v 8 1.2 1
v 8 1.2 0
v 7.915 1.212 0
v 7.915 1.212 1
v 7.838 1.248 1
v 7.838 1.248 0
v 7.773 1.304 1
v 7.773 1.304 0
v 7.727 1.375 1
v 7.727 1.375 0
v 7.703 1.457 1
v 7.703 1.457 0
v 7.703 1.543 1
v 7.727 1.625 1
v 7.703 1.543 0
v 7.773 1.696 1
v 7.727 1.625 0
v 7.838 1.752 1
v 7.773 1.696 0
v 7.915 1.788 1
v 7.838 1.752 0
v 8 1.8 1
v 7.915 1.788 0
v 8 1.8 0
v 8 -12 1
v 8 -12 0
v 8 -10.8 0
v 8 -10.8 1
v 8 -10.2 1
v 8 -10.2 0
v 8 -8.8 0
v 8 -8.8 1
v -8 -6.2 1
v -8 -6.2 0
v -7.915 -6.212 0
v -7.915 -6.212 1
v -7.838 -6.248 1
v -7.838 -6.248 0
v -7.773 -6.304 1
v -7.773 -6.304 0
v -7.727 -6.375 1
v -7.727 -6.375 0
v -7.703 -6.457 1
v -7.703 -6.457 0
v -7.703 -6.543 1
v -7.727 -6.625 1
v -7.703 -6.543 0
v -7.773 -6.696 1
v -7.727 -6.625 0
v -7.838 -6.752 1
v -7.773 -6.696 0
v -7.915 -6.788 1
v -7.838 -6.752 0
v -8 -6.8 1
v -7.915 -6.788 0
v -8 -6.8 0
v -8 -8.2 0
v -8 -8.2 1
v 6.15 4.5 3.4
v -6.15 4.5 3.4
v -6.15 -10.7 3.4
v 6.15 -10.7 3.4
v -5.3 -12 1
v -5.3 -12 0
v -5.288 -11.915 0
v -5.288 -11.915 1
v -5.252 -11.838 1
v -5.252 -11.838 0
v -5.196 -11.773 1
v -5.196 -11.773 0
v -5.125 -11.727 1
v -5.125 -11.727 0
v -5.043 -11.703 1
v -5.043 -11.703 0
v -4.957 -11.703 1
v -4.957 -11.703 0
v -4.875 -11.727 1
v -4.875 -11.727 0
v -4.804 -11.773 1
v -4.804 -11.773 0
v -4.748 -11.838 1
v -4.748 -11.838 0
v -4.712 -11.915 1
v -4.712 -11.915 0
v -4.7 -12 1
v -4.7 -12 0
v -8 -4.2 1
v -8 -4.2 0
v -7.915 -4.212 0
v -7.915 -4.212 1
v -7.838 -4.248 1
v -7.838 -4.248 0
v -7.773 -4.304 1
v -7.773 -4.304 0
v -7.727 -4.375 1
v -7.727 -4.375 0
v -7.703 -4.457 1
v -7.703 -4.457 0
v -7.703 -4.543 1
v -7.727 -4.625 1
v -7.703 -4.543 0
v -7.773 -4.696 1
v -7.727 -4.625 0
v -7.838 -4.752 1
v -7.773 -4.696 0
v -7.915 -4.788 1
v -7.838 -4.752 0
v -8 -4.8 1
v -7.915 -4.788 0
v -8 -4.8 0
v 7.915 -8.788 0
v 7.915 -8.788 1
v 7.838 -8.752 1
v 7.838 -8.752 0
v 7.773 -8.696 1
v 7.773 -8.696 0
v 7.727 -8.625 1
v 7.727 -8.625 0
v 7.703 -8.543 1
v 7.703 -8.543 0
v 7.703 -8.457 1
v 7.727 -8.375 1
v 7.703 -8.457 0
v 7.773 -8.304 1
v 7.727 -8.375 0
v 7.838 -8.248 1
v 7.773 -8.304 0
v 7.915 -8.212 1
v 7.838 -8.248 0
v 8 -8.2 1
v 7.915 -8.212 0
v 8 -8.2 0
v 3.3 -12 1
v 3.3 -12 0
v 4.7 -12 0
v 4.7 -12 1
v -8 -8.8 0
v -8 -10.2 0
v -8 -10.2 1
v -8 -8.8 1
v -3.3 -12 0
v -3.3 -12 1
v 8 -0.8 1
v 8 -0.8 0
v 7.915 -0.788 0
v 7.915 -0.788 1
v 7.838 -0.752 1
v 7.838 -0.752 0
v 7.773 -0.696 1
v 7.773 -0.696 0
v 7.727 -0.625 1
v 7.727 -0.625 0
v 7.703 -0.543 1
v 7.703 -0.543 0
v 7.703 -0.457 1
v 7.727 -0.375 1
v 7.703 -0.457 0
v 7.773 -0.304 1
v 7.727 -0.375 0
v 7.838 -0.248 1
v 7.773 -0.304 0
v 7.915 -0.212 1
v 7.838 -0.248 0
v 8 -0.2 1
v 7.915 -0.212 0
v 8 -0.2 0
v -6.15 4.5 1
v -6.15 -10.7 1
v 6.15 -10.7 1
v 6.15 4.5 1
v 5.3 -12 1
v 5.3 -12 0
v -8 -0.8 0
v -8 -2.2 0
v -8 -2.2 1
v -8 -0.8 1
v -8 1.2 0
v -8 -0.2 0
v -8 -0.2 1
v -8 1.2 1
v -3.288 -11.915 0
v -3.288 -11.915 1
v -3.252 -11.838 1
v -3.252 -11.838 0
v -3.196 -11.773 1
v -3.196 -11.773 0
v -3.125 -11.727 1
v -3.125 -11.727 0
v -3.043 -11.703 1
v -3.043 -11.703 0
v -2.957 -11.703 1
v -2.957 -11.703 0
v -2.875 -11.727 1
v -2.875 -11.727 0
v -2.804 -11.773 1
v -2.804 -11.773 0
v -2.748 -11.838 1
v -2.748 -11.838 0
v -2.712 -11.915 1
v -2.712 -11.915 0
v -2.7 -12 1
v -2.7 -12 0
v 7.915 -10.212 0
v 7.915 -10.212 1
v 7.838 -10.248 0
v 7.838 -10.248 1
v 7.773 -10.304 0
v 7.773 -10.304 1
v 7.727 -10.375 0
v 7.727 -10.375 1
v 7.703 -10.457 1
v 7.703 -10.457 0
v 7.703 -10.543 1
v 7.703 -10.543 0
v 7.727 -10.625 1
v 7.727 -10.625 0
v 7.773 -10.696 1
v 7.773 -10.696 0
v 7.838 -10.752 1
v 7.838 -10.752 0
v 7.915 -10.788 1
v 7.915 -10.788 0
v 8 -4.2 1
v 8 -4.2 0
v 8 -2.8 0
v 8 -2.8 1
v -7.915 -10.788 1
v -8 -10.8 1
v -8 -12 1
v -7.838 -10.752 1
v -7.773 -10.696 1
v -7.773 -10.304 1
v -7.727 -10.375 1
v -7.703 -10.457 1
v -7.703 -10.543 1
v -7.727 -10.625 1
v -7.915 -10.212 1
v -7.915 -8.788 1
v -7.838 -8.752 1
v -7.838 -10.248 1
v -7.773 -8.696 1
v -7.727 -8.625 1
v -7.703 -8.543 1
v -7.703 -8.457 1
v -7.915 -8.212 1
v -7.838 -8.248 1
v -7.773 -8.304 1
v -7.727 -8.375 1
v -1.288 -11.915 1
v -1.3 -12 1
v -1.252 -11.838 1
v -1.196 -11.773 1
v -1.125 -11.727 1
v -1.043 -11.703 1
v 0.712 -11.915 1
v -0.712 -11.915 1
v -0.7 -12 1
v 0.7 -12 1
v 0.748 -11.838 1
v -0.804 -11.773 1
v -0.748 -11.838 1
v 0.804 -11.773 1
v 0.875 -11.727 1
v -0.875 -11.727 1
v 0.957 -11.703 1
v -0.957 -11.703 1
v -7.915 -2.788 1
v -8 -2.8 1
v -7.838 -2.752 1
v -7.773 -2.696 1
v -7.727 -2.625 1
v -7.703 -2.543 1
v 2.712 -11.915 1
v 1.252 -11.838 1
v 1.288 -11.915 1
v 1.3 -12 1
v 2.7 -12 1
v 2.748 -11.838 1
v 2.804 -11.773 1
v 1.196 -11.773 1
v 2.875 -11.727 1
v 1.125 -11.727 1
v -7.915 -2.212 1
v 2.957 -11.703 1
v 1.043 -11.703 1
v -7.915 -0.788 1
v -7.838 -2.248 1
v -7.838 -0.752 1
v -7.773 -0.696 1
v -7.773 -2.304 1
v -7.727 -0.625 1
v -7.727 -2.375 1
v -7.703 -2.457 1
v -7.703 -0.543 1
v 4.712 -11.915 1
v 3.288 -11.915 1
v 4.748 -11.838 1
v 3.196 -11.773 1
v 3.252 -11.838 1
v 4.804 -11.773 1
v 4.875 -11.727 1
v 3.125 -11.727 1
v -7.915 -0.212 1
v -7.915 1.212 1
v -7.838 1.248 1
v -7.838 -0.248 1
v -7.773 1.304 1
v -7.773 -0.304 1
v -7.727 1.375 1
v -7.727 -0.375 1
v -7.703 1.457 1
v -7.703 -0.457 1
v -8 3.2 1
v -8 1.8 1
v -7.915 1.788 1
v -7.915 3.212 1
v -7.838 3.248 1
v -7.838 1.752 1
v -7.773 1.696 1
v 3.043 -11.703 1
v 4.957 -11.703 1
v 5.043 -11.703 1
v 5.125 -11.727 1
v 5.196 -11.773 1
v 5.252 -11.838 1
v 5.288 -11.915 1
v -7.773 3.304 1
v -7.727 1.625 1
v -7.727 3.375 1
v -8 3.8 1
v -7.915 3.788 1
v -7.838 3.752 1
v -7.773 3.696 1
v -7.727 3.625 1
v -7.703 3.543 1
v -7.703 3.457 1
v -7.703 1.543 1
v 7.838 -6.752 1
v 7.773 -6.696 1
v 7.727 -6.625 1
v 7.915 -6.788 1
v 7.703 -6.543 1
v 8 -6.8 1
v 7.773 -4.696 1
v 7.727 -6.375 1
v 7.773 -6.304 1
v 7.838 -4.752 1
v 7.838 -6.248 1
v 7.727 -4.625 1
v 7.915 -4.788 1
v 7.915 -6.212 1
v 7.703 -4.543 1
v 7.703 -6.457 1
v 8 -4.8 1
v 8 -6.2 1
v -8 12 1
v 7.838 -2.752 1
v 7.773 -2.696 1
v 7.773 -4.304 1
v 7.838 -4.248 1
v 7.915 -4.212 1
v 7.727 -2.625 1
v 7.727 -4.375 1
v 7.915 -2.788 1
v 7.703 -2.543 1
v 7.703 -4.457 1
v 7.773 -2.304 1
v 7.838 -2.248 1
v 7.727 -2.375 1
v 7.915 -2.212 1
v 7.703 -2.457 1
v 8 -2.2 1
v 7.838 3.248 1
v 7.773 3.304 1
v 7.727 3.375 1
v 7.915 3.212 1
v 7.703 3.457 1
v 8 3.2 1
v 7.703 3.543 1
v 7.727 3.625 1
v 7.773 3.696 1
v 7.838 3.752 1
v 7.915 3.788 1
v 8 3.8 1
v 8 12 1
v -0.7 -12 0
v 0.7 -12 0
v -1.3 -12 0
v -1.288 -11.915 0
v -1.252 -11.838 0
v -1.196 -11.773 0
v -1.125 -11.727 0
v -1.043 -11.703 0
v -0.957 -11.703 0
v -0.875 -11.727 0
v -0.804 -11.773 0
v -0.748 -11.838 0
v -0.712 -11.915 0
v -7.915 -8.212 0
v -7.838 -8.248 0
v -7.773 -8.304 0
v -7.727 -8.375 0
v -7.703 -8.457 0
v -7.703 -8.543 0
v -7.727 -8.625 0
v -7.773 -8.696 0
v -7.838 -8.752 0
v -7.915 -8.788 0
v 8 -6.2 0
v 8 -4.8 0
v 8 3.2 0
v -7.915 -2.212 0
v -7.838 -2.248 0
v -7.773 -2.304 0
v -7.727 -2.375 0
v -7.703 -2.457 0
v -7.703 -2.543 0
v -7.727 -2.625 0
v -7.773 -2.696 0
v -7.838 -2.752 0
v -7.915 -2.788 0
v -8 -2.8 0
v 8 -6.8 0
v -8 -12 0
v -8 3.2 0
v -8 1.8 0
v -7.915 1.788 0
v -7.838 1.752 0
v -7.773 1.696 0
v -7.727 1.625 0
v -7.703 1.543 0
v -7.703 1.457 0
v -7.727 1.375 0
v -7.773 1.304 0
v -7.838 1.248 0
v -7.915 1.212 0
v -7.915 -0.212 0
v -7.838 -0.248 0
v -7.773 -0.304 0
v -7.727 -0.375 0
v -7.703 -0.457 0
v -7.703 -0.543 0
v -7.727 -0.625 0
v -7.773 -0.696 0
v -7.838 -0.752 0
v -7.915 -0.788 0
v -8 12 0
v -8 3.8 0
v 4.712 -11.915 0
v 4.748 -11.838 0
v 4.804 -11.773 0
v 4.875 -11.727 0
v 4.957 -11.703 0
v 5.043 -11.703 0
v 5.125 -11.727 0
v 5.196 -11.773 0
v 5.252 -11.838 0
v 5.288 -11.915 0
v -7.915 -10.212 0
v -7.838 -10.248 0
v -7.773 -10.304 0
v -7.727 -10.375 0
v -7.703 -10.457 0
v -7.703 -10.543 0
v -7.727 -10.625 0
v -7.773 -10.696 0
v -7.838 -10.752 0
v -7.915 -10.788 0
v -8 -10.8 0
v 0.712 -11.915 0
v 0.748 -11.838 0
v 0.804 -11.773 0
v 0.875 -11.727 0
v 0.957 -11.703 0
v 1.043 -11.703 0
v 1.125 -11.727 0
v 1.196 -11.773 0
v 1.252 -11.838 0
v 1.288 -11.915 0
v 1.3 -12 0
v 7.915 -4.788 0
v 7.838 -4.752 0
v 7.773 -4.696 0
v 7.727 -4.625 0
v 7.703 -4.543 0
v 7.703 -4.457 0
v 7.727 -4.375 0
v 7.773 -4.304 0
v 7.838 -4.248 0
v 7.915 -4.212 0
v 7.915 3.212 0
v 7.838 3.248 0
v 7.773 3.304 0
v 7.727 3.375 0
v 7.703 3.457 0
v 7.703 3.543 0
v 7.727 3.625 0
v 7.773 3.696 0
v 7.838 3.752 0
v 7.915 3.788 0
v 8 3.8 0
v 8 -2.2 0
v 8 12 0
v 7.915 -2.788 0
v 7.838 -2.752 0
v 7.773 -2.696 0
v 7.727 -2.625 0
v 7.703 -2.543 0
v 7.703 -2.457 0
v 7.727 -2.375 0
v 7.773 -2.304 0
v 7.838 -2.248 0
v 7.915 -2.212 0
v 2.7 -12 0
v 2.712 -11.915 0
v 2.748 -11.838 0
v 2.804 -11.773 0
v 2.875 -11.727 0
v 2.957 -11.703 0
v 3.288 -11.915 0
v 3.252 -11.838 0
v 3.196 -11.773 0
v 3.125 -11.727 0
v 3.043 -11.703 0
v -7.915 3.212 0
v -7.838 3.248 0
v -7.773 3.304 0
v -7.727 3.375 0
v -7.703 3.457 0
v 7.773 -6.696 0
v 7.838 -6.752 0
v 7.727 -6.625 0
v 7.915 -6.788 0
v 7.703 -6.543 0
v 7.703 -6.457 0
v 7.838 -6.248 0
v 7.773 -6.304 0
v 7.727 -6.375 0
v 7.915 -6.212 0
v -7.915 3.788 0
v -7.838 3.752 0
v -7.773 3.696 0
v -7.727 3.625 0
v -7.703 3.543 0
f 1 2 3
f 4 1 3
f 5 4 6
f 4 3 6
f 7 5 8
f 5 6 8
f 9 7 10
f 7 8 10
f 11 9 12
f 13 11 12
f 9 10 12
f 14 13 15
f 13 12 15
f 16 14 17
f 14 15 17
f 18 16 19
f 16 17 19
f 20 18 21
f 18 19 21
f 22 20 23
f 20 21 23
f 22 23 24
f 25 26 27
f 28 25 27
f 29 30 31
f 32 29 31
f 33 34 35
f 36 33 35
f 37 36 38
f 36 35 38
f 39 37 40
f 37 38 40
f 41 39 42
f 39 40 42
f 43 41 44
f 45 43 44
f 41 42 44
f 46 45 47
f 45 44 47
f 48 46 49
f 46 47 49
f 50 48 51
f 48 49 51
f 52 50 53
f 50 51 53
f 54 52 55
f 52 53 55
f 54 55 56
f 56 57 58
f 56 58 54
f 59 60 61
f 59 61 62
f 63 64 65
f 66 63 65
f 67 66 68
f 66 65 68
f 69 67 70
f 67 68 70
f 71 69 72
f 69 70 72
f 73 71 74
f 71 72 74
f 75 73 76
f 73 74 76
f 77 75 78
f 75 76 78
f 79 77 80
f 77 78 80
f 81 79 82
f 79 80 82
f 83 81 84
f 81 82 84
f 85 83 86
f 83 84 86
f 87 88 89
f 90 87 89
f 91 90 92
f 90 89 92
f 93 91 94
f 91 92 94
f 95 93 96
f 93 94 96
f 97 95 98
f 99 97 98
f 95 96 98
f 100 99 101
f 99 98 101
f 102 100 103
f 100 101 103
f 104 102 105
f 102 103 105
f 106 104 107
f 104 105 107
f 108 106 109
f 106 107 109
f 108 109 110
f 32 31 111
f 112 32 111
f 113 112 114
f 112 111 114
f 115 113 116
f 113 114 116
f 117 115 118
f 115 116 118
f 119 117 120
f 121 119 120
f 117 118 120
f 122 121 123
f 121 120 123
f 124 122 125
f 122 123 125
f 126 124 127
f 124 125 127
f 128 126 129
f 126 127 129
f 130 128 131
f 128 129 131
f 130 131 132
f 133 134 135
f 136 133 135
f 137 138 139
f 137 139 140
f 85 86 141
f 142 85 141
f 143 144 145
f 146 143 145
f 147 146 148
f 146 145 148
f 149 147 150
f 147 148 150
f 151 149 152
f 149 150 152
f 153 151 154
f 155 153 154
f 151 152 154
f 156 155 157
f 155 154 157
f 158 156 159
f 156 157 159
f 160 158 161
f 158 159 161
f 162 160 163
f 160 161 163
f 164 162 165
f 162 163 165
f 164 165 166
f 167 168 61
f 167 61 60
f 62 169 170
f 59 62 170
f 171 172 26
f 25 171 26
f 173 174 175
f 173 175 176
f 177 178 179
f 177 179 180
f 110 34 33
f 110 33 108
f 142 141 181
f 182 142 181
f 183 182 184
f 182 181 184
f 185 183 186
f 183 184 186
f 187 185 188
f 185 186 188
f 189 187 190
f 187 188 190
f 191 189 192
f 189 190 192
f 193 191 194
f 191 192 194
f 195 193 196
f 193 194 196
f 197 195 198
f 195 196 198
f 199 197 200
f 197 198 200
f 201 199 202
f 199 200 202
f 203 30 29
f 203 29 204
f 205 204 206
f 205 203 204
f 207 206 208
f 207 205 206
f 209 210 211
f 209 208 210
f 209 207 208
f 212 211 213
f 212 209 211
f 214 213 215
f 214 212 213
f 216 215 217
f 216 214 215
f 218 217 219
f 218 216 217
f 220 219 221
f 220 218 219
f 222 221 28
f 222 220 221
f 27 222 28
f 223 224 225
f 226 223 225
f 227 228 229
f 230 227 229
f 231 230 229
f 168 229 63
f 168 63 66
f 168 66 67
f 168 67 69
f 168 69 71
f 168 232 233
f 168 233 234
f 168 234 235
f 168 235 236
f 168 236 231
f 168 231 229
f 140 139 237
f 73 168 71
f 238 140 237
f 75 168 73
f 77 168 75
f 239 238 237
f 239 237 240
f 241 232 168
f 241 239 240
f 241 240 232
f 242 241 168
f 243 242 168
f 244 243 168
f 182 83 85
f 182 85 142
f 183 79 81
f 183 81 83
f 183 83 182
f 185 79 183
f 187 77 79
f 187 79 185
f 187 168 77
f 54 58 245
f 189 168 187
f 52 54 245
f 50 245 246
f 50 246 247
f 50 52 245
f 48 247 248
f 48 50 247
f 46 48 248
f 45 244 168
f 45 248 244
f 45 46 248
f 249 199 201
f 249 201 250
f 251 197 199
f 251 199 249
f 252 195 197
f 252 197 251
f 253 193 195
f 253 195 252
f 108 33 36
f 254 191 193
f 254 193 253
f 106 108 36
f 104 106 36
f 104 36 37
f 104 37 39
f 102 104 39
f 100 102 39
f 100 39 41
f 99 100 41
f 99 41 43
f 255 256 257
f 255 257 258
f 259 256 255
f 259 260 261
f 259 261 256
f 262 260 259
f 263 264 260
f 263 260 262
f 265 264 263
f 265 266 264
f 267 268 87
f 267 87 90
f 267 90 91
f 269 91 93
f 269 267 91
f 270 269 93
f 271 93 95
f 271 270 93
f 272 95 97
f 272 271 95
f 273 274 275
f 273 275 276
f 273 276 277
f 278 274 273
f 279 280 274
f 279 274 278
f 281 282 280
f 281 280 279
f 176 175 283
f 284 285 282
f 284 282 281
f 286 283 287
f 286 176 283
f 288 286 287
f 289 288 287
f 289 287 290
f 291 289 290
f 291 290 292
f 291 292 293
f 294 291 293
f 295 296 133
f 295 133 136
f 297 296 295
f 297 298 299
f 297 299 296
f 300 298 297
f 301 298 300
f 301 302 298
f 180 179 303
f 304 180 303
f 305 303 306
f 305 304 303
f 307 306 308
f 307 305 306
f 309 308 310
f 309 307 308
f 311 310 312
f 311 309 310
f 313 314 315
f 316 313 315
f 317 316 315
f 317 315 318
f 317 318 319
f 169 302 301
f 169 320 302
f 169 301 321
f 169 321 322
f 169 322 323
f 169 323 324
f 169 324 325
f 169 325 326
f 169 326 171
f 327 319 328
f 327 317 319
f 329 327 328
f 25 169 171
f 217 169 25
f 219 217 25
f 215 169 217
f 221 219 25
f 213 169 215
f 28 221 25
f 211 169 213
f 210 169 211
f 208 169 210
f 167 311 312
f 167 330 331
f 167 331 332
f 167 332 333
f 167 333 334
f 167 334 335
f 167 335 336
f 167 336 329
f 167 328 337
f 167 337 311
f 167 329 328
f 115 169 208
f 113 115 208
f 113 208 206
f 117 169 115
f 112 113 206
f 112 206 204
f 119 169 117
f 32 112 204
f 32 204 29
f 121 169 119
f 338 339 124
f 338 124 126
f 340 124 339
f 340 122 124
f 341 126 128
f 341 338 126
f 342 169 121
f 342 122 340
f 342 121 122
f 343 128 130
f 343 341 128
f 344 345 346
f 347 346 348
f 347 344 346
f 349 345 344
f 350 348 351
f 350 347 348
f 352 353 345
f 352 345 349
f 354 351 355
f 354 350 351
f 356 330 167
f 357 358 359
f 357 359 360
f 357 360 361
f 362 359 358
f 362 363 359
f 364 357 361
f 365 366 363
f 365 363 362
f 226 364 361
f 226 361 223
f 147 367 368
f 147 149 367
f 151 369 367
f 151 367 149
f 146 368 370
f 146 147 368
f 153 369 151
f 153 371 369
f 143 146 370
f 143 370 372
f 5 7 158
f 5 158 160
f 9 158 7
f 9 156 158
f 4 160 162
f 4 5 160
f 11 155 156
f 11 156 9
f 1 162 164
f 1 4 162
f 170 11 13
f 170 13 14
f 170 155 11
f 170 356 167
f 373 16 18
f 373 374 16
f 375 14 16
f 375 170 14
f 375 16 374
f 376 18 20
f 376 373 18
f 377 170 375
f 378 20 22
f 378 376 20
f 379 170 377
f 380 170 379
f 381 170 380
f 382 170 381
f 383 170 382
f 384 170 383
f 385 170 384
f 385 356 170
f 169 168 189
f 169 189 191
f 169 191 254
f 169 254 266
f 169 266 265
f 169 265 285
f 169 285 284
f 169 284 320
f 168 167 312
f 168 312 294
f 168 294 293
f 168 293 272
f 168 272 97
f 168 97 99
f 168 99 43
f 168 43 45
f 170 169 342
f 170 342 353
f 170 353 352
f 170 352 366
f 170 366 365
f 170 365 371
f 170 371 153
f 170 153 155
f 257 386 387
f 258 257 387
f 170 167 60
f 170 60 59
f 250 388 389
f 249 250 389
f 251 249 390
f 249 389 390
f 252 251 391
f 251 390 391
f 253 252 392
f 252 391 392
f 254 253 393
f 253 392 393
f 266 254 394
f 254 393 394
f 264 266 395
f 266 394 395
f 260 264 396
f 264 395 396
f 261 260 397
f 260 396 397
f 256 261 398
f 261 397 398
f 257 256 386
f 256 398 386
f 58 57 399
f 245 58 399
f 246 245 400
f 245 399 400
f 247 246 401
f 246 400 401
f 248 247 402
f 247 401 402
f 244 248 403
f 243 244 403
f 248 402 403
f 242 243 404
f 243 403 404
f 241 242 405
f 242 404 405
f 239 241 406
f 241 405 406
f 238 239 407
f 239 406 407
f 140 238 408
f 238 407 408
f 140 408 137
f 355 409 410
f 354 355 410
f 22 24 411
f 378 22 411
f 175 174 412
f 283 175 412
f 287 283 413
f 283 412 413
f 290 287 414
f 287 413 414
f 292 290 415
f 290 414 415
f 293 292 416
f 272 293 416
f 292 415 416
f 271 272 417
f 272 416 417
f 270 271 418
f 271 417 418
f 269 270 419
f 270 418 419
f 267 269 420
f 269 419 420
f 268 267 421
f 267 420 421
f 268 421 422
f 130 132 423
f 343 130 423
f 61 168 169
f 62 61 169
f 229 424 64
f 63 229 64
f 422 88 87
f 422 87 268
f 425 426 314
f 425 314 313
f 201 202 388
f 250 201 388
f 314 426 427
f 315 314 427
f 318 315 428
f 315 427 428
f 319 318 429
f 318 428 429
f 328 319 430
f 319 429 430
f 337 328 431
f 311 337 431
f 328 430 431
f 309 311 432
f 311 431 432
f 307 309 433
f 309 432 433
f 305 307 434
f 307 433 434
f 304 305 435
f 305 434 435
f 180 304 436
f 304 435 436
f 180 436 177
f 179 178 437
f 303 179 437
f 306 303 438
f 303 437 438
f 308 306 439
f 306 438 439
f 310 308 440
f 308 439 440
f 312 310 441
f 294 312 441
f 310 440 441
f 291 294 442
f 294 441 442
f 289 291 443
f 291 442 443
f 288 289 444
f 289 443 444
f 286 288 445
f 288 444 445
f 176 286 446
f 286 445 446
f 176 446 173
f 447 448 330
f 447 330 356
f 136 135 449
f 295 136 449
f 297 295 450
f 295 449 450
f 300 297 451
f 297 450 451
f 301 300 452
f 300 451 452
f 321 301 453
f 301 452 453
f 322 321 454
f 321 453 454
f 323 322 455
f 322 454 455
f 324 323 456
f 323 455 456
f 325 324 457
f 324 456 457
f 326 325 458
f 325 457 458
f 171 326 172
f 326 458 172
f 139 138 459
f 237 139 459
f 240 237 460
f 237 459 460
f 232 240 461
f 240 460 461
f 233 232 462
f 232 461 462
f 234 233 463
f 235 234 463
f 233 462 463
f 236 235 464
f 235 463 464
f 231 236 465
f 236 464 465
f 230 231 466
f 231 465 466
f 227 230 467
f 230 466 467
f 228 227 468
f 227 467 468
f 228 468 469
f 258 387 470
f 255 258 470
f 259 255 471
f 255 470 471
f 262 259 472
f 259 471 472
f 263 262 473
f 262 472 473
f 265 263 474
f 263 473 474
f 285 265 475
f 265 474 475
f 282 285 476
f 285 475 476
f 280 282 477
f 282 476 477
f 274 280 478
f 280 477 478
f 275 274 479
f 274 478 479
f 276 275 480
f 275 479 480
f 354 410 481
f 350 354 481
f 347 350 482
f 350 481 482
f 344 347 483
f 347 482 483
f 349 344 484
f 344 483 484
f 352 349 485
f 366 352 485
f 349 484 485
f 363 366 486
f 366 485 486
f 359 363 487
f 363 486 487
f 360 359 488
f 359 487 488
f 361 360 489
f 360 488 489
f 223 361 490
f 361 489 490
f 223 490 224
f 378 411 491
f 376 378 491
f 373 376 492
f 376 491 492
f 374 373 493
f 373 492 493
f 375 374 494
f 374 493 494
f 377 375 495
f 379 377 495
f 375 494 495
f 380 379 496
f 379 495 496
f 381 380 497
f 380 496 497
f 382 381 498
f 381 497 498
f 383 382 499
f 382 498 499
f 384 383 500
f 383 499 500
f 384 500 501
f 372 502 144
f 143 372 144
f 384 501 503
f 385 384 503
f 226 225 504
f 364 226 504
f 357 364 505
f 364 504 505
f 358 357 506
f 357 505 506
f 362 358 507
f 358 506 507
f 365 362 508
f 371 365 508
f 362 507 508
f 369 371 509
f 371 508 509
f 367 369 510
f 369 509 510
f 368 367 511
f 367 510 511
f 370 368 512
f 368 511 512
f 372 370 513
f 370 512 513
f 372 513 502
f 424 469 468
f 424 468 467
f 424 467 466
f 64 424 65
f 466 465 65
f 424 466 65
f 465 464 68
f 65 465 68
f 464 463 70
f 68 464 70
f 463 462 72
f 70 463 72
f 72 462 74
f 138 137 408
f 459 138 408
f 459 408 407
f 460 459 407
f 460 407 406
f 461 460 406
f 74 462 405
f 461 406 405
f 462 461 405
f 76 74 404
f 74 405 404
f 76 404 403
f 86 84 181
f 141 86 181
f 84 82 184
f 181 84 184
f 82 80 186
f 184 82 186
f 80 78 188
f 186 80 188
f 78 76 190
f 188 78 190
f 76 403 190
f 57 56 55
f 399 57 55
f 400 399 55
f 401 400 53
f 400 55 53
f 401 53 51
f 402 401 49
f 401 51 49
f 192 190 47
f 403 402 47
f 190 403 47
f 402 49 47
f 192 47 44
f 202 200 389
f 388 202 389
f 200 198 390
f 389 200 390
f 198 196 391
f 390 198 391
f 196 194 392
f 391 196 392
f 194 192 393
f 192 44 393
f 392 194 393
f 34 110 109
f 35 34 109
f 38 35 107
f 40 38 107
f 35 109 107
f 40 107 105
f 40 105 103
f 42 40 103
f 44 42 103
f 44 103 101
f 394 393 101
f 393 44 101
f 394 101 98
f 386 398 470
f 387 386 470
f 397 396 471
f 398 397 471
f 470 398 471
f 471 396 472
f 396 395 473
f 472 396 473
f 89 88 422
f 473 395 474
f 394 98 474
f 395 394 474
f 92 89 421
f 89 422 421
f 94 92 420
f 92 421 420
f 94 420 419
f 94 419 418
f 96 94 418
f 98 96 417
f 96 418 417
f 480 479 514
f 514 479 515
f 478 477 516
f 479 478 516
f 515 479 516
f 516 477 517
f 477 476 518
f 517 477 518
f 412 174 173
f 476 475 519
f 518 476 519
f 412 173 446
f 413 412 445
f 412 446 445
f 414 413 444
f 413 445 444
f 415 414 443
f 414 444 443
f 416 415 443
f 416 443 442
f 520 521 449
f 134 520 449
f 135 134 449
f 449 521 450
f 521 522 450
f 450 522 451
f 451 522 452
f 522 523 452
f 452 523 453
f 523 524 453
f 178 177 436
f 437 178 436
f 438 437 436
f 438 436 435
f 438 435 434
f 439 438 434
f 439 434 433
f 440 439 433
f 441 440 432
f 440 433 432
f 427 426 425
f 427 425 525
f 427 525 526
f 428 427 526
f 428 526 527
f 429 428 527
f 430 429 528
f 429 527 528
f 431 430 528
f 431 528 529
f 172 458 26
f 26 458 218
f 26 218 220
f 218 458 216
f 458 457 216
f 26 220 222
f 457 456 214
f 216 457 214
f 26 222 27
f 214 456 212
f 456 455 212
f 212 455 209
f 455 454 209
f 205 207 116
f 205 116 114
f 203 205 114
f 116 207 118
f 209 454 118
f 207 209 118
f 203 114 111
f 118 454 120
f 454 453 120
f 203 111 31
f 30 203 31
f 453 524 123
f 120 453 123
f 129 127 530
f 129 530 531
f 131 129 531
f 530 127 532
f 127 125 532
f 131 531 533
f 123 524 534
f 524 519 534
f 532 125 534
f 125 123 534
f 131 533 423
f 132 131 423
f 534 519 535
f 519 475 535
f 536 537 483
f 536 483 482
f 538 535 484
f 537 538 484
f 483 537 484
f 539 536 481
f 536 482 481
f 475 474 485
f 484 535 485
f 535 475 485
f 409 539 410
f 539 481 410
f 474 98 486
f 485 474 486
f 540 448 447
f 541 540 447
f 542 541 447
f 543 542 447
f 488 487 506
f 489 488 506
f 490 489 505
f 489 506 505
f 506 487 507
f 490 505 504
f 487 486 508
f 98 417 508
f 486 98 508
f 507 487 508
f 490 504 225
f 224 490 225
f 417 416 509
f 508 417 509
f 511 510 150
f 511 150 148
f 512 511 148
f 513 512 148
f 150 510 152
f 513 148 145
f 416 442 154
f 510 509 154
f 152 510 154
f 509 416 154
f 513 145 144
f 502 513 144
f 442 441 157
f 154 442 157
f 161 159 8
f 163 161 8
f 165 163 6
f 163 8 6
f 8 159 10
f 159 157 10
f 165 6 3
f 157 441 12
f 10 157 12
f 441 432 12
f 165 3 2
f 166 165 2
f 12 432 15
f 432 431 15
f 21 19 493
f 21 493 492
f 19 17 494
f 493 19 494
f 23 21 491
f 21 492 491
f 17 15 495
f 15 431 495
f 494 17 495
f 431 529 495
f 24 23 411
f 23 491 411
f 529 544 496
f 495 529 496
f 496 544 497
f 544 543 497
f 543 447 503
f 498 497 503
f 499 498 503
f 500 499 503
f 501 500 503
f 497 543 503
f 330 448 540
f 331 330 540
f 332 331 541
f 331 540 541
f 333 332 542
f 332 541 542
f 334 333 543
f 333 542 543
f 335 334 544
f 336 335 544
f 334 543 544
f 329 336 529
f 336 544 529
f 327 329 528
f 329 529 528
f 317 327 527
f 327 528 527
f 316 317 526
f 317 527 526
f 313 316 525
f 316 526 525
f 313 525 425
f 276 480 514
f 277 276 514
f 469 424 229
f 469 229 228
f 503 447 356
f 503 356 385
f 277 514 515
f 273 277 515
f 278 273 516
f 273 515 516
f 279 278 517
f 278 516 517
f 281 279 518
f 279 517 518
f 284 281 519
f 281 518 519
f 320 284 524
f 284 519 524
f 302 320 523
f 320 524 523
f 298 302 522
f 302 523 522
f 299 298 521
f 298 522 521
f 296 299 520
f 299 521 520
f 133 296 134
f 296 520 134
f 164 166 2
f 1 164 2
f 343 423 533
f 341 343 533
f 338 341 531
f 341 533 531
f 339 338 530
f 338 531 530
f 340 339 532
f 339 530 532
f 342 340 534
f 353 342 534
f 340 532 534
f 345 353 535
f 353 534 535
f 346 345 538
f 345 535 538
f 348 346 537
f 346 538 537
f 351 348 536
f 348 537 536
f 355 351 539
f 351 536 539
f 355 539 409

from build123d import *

# Parameters (mm, degrees)
SKETCH1_W               = 16
SKETCH1_H               = 24
BOSS_EXTRUDE1_DEPTH     = 1
SKETCH2_W               = 12.3
SKETCH2_H               = 15.2
BOSS_EXTRUDE2_DEPTH     = 2.4
SKETCH3_R               = 0.3
CUT_EXTRUDE1_DEPTH      = 15.817557154
LPATTERN1_COUNT         = 8
LPATTERN1_PITCH         = 2
MIRROR1_COPY_1_SKETCH_R = 0.3
MIRROR1_COPY_1_DEPTH    = 15.817557154
MIRROR1_COPY_2_SKETCH_R = 0.3
MIRROR1_COPY_2_DEPTH    = 15.817557154
MIRROR1_COPY_3_SKETCH_R = 0.3
MIRROR1_COPY_3_DEPTH    = 15.817557154
MIRROR1_COPY_4_SKETCH_R = 0.3
MIRROR1_COPY_4_DEPTH    = 15.817557154
MIRROR1_COPY_5_SKETCH_R = 0.3
MIRROR1_COPY_5_DEPTH    = 15.817557154
MIRROR1_COPY_6_SKETCH_R = 0.3
MIRROR1_COPY_6_DEPTH    = 15.817557154
MIRROR1_COPY_7_SKETCH_R = 0.3
MIRROR1_COPY_7_DEPTH    = 15.817557154
SKETCH4_R               = 0.3
CUT_EXTRUDE2_DEPTH      = 15.817557154
LPATTERN2_COUNT         = 6
LPATTERN2_PITCH         = 2


with BuildPart() as part:
    # Sketch1 → Boss-Extrude1 (new body)
    with BuildSketch(Plane.XY):
        Rectangle(SKETCH1_W, SKETCH1_H)
    extrude(amount=BOSS_EXTRUDE1_DEPTH)

    # Sketch2 → Boss-Extrude2 (add)
    with BuildSketch(Plane.XY.offset(1)):
        with Locations((0, -3.1)):
            Rectangle(SKETCH2_W, SKETCH2_H)
    extrude(amount=BOSS_EXTRUDE2_DEPTH)

    # Sketch3 → Cut-Extrude1 (cut, through all)
    with BuildSketch(Plane(origin=(0, 0, 0), x_dir=(-1, 0, 0), z_dir=(0, 0, -1))):
        with Locations((8, -10.5)):
            Circle(SKETCH3_R)
    cut_extrude1 = extrude(amount=-CUT_EXTRUDE1_DEPTH, mode=Mode.SUBTRACT)

    # LPattern1: Cut-Extrude1 ×8
    with Locations(*[(0, i * LPATTERN1_PITCH, 0) for i in range(1, LPATTERN1_COUNT)]):
        add(cut_extrude1, mode=Mode.SUBTRACT)

    # Mirror1: Cut-Extrude1 across plane
    add(cut_extrude1.mirror(Plane(origin=(0, 0, 0), x_dir=(0, 0, 1), z_dir=(1, 0, 0))), mode=Mode.SUBTRACT)

    # Mirror1 copy 1 sketch → Mirror1 copy 1 (cut, through all)
    with BuildSketch(Plane(origin=(0, 2, 0), x_dir=(1, 0, 0), z_dir=(0, 0, -1))):
        with Locations((8, 10.5)):
            Circle(MIRROR1_COPY_1_SKETCH_R)
    extrude(amount=-MIRROR1_COPY_1_DEPTH, mode=Mode.SUBTRACT)

    # Mirror1 copy 2 sketch → Mirror1 copy 2 (cut, through all)
    with BuildSketch(Plane(origin=(0, 4, 0), x_dir=(1, 0, 0), z_dir=(0, 0, -1))):
        with Locations((8, 10.5)):
            Circle(MIRROR1_COPY_2_SKETCH_R)
    extrude(amount=-MIRROR1_COPY_2_DEPTH, mode=Mode.SUBTRACT)

    # Mirror1 copy 3 sketch → Mirror1 copy 3 (cut, through all)
    with BuildSketch(Plane(origin=(0, 6, 0), x_dir=(1, 0, 0), z_dir=(0, 0, -1))):
        with Locations((8, 10.5)):
            Circle(MIRROR1_COPY_3_SKETCH_R)
    extrude(amount=-MIRROR1_COPY_3_DEPTH, mode=Mode.SUBTRACT)

    # Mirror1 copy 4 sketch → Mirror1 copy 4 (cut, through all)
    with BuildSketch(Plane(origin=(0, 8, 0), x_dir=(1, 0, 0), z_dir=(0, 0, -1))):
        with Locations((8, 10.5)):
            Circle(MIRROR1_COPY_4_SKETCH_R)
    extrude(amount=-MIRROR1_COPY_4_DEPTH, mode=Mode.SUBTRACT)

    # Mirror1 copy 5 sketch → Mirror1 copy 5 (cut, through all)
    with BuildSketch(Plane(origin=(0, 10, 0), x_dir=(1, 0, 0), z_dir=(0, 0, -1))):
        with Locations((8, 10.5)):
            Circle(MIRROR1_COPY_5_SKETCH_R)
    extrude(amount=-MIRROR1_COPY_5_DEPTH, mode=Mode.SUBTRACT)

    # Mirror1 copy 6 sketch → Mirror1 copy 6 (cut, through all)
    with BuildSketch(Plane(origin=(0, 12, 0), x_dir=(1, 0, 0), z_dir=(0, 0, -1))):
        with Locations((8, 10.5)):
            Circle(MIRROR1_COPY_6_SKETCH_R)
    extrude(amount=-MIRROR1_COPY_6_DEPTH, mode=Mode.SUBTRACT)

    # Mirror1 copy 7 sketch → Mirror1 copy 7 (cut, through all)
    with BuildSketch(Plane(origin=(0, 14, 0), x_dir=(1, 0, 0), z_dir=(0, 0, -1))):
        with Locations((8, 10.5)):
            Circle(MIRROR1_COPY_7_SKETCH_R)
    extrude(amount=-MIRROR1_COPY_7_DEPTH, mode=Mode.SUBTRACT)

    # Sketch4 → Cut-Extrude2 (cut, through all)
    with BuildSketch(Plane(origin=(0, 0, 0), x_dir=(-1, 0, 0), z_dir=(0, 0, -1))):
        with Locations((5, -12)):
            Circle(SKETCH4_R)
    cut_extrude2 = extrude(amount=-CUT_EXTRUDE2_DEPTH, mode=Mode.SUBTRACT)

    # LPattern2: Cut-Extrude2 ×6
    with Locations(*[(i * LPATTERN2_PITCH, 0, 0) for i in range(1, LPATTERN2_COUNT)]):
        add(cut_extrude2, mode=Mode.SUBTRACT)


solid = part.part
